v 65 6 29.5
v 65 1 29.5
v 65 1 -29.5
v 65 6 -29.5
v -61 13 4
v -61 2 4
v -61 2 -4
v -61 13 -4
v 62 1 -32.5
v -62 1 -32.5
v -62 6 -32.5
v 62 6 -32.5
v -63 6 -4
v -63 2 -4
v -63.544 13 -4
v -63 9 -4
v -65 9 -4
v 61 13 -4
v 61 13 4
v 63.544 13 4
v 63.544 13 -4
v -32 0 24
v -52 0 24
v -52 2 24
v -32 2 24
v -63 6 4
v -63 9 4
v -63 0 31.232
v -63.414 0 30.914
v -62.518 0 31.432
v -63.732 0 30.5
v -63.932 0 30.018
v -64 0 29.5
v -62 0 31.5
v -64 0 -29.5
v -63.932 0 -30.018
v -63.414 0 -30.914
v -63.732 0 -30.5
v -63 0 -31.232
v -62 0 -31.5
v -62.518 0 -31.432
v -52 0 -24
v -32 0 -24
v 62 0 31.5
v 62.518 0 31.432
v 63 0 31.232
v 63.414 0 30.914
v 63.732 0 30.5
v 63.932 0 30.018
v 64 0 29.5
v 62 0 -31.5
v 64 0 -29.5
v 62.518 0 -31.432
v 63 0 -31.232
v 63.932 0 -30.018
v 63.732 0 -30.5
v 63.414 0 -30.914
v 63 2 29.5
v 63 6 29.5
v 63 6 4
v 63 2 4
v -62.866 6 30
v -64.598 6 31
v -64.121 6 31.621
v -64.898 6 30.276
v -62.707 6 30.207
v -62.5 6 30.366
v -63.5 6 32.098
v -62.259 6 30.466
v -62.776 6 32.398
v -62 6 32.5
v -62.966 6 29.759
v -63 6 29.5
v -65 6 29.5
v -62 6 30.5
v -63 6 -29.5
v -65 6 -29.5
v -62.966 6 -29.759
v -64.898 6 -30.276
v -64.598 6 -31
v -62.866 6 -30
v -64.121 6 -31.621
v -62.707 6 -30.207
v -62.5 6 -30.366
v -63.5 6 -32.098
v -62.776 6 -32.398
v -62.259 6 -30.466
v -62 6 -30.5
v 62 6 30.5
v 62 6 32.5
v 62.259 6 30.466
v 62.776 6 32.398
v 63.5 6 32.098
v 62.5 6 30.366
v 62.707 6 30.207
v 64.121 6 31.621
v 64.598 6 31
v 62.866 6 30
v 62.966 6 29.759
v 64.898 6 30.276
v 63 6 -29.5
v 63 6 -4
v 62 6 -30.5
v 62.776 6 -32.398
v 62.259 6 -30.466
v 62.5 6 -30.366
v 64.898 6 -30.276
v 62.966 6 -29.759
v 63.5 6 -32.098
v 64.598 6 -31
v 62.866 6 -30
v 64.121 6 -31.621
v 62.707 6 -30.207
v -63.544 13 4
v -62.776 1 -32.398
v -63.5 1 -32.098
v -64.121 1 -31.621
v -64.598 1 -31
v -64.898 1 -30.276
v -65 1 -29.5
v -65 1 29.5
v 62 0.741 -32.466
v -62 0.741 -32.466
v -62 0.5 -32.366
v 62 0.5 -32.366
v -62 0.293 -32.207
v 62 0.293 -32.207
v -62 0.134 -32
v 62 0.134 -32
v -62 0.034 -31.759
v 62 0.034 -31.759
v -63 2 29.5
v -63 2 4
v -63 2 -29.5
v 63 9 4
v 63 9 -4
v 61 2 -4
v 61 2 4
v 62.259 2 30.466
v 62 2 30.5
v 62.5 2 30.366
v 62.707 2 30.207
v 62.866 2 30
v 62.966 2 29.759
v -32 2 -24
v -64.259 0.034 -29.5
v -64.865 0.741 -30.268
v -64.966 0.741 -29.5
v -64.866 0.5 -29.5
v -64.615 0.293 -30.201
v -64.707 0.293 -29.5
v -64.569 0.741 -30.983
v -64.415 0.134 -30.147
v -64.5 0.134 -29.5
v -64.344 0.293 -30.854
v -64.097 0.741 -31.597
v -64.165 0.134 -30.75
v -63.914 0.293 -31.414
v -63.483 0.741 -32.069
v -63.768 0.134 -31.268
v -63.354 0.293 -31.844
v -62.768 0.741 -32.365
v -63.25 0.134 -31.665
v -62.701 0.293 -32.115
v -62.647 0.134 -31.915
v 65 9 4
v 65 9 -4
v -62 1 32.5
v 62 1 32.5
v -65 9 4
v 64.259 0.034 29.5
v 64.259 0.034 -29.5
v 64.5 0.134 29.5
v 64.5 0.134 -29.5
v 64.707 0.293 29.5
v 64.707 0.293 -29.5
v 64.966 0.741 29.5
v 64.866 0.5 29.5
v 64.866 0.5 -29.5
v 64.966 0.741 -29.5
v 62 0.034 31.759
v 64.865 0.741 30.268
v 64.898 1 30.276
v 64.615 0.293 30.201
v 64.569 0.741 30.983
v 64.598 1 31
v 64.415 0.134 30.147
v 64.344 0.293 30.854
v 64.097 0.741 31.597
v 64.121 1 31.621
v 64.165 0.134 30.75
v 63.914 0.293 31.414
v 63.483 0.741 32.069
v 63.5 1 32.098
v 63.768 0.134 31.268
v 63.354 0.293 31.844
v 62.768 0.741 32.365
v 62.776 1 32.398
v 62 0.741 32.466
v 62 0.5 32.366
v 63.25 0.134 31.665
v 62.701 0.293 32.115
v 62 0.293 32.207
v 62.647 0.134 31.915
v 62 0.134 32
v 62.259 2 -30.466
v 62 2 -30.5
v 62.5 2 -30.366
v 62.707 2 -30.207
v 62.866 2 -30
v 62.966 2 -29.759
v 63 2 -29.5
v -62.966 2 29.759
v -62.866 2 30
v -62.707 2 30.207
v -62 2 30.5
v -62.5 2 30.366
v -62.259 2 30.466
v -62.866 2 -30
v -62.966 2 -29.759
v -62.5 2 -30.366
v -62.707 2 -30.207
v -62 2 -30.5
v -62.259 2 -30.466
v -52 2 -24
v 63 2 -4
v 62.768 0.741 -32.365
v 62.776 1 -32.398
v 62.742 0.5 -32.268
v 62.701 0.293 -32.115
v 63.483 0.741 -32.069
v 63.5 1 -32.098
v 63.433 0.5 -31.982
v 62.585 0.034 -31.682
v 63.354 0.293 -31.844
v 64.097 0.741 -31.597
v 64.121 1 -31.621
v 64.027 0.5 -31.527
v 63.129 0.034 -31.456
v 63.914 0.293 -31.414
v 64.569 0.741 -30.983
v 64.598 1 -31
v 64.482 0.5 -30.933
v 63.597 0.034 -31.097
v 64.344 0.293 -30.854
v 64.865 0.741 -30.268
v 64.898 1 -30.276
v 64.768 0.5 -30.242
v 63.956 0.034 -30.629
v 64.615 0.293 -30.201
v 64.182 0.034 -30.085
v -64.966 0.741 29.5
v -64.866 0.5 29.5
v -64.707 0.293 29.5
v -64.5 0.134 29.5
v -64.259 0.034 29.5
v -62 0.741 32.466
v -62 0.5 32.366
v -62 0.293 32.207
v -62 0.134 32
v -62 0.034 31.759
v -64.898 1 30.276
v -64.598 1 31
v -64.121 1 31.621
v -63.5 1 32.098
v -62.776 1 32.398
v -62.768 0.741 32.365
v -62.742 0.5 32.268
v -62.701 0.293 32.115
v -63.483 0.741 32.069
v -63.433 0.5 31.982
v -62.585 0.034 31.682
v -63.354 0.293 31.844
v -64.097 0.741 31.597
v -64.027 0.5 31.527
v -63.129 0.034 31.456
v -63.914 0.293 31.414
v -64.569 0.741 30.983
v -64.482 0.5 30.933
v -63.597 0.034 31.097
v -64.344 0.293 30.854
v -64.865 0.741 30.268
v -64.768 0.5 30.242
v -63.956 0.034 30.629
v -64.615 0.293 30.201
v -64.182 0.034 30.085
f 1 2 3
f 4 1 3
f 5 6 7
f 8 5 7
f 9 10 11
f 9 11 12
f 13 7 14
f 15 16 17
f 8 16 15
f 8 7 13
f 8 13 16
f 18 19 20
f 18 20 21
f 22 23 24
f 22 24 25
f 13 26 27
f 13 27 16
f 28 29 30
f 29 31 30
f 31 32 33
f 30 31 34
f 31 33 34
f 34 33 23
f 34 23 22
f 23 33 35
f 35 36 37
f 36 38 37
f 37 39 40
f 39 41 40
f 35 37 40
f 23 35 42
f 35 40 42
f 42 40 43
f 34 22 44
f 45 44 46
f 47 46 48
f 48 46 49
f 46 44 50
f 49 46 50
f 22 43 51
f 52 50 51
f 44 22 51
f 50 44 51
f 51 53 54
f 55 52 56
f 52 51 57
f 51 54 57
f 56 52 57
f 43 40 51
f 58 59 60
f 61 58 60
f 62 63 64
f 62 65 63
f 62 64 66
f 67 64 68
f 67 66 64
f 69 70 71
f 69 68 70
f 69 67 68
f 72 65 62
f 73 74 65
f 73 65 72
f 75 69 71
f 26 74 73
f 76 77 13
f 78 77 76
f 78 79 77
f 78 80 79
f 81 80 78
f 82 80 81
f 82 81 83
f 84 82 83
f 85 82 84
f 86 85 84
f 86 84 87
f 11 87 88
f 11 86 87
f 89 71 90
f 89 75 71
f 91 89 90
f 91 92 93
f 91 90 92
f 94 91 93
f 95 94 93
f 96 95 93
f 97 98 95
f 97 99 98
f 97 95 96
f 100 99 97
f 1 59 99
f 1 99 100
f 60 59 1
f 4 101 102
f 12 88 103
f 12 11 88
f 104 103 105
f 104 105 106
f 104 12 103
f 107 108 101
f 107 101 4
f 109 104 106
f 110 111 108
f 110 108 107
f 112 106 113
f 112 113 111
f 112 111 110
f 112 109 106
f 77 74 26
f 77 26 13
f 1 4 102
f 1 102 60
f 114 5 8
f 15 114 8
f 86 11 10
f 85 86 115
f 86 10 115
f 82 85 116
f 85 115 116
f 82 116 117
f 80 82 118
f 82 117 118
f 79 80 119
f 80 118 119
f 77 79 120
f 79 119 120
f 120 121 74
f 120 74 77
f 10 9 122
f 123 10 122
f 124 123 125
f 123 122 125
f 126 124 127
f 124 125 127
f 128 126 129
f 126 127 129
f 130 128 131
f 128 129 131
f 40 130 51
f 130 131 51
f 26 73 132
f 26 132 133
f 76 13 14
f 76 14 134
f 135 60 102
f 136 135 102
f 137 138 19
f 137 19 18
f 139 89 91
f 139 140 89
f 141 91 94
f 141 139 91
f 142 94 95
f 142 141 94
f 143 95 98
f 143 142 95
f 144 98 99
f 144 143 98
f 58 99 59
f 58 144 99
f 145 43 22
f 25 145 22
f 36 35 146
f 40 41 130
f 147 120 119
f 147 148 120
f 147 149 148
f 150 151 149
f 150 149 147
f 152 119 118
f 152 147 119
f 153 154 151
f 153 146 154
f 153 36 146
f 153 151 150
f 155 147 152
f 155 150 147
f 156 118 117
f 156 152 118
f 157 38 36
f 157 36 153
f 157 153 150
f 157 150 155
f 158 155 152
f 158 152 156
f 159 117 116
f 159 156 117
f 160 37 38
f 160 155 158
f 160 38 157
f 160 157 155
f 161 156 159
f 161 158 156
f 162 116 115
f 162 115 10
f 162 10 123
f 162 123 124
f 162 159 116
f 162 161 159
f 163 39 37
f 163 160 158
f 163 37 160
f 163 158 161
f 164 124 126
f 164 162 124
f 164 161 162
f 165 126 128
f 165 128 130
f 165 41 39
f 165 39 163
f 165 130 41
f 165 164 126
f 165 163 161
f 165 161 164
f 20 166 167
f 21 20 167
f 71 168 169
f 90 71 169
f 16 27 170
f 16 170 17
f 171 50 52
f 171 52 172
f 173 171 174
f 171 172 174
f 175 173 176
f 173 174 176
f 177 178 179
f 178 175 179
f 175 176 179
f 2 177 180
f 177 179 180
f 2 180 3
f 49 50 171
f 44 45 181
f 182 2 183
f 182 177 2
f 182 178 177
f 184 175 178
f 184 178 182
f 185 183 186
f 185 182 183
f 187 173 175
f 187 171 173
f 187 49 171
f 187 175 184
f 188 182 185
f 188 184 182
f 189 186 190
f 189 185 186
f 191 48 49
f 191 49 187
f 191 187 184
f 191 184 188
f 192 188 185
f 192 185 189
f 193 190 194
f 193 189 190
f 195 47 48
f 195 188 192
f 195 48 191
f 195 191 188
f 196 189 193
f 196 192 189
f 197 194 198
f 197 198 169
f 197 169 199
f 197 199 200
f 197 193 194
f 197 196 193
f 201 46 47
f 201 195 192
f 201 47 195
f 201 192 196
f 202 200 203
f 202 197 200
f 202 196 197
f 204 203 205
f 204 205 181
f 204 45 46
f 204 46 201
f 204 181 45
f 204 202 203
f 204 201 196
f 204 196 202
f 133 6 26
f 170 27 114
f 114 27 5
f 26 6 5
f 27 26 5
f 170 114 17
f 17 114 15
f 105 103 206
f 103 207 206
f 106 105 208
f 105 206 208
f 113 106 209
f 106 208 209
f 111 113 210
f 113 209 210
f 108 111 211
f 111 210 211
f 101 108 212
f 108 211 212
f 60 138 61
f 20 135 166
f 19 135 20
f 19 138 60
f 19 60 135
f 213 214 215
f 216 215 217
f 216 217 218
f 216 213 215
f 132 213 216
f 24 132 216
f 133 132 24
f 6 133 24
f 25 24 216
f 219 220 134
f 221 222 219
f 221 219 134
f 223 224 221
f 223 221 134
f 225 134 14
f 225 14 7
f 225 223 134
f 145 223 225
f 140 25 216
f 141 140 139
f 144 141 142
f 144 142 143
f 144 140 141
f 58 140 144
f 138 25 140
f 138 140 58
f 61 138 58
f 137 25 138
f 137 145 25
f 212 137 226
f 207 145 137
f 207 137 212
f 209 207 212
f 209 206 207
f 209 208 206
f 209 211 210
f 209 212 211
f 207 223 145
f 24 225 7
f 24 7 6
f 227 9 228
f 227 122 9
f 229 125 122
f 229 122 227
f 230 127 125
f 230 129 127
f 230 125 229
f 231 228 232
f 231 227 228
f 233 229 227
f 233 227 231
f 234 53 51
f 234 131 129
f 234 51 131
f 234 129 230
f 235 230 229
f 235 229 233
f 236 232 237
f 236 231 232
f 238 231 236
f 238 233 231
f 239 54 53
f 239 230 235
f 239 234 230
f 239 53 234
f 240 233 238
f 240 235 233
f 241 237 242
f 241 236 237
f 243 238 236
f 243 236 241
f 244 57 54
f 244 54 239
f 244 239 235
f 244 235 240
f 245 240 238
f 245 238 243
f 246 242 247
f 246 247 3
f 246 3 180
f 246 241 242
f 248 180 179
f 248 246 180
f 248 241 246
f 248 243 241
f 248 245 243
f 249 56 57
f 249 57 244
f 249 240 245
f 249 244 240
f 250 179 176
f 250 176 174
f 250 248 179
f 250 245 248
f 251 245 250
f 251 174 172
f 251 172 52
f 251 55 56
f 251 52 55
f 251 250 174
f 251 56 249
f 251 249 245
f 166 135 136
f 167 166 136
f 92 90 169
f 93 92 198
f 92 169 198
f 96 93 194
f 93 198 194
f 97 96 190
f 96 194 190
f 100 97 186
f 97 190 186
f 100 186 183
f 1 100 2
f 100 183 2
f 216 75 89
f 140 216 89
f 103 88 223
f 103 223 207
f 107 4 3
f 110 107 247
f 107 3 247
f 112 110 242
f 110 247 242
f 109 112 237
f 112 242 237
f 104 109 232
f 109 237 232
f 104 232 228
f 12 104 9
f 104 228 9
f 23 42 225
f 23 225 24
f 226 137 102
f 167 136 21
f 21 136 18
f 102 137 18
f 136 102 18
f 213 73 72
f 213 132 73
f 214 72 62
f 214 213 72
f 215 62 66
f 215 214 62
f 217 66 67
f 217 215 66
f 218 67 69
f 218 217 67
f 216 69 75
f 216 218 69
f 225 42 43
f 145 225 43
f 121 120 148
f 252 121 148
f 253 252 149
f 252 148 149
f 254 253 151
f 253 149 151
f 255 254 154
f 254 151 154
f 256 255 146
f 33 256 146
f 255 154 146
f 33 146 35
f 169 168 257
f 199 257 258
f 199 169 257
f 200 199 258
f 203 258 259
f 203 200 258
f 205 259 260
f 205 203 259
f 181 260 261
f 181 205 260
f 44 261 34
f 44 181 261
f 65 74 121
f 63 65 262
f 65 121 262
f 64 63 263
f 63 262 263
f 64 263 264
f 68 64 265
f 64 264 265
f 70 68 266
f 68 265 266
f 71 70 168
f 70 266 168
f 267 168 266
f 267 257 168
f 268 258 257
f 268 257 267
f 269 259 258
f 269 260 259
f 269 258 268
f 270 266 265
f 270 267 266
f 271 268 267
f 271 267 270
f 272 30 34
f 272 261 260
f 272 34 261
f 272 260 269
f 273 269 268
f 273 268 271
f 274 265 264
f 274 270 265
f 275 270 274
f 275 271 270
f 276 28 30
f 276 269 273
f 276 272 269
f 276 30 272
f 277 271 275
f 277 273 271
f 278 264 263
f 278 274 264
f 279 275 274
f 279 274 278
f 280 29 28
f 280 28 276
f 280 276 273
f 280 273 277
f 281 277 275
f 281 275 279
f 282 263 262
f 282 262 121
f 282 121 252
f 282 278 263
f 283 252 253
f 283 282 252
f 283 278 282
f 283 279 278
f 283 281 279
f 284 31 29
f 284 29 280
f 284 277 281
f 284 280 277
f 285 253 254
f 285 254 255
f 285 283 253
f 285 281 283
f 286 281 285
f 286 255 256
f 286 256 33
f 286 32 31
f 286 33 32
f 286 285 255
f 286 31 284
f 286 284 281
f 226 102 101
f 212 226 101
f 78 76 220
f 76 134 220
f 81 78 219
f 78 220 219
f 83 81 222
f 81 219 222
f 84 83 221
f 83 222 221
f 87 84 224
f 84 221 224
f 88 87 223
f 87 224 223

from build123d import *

# Parameters (mm, degrees)
SKETCH_1_W                  = 130
SKETCH_1_H                  = 65
EXTRUDE_1_DEPTH             = 6
SKETCH_2_W                  = 126
SKETCH_2_H                  = 61
CUT_EXTRUDE_1_DEPTH         = 4
FILLET_1_R                  = 1
SKETCH_9_W                  = 20
SKETCH_9_H                  = 48
CUT_EXTRUDE_3_DEPTH         = 2
SKETCH_6_W                  = 2
SKETCH_6_H                  = 8
EXTRUDE_2_DEPTH             = 11
SKETCH_12_W                 = 8
SKETCH_12_H                 = 4
EXTRUDE_4_DEPTH             = 2
CHAMFER_2_SIZE2             = 4
CHAMFER_2_SIZE              = 1.455880937
CHAMFER_2_OF_MIRROR_2_SIZE2 = 1.455880937
CHAMFER_2_OF_MIRROR_2_SIZE  = 4
FILLET_2_R                  = 1
FILLET_3_R                  = 3


# Some blends are built 0.0001 mm under size
with BuildPart() as part:
    # Эскиз1 → Бобышка-Вытянуть1 (new body)
    with BuildSketch(Plane(origin=(0, 0, 0), x_dir=(1, 0, 0), z_dir=(0, 1, 0))):
        Rectangle(SKETCH_1_W, SKETCH_1_H)
    extrude(amount=EXTRUDE_1_DEPTH)

    # Эскиз2 → Вырез-Вытянуть1 (cut)
    with BuildSketch(Plane(origin=(0, 6, 0), x_dir=(1, 0, 0), z_dir=(0, 1, 0))):
        Rectangle(SKETCH_2_W, SKETCH_2_H)
    extrude(amount=-CUT_EXTRUDE_1_DEPTH, mode=Mode.SUBTRACT)

    # Скругление1
    fillet_1_edges = [part.edges().sort_by_distance(p)[0] for p in [
        (0, 0, 32.5),
        (-65, 0, 0),
        (0, 0, -32.5),
        (65, 0, 0),
    ]]
    fillet(fillet_1_edges, radius=FILLET_1_R)

    # Эскиз9 → Вырез-Вытянуть3 (cut)
    with BuildSketch(Plane.XZ):
        with Locations((-42, 0)):
            Rectangle(SKETCH_9_W, SKETCH_9_H)
    extrude(amount=-CUT_EXTRUDE_3_DEPTH, mode=Mode.SUBTRACT)

    # Эскиз6 → Бобышка-Вытянуть2 (add)
    with BuildSketch(Plane(origin=(0, 2, 0), x_dir=(1, 0, 0), z_dir=(0, 1, 0))):
        with Locations((62, 0)):
            Rectangle(SKETCH_6_W, SKETCH_6_H)
    extrude_2 = extrude(amount=EXTRUDE_2_DEPTH)

    # Эскиз12 → Бобышка-Вытянуть4 (add)
    with BuildSketch(Plane(origin=(63, 0, 0), x_dir=(0, 0, -1), z_dir=(1, 0, 0))):
        with Locations((0, 11)):
            Rectangle(SKETCH_12_W, SKETCH_12_H)
    extrude_4 = extrude(amount=EXTRUDE_4_DEPTH)

    # Фаска2
    chamfer_2_edges = [part.edges().sort_by_distance(p)[0] for p in [
        (65, 13, 0),
    ]]
    chamfer_2_side = [part.faces().sort_by_distance(p)[0] for p in [
        (64.970882381, 13, 0),
    ]]
    chamfer(chamfer_2_edges, length=CHAMFER_2_SIZE - 0.0001, length2=CHAMFER_2_SIZE2 - 0.0001, reference=chamfer_2_side[0])  # a hair under: the kernel refuses the full size

    # Зеркальное отражение2: Бобышка-Вытянуть2, Бобышка-Вытянуть4 across plane
    add(extrude_2.mirror(Plane(origin=(0, 0, 0), x_dir=(0, 0, 1), z_dir=(1, 0, 0))))
    add(extrude_4.mirror(Plane(origin=(0, 0, 0), x_dir=(0, 0, 1), z_dir=(1, 0, 0))))

    # Фаска2 of Зеркальное отражение2
    chamfer_2_of_mirror_2_edges = [part.edges().sort_by_distance(p)[0] for p in [
        (-65, 13, 0),
    ]]
    chamfer_2_of_mirror_2_side = [part.faces().sort_by_distance(p)[0] for p in [
        (-65, 12.970882381, 0),
    ]]
    chamfer(chamfer_2_of_mirror_2_edges, length=CHAMFER_2_OF_MIRROR_2_SIZE - 0.0001, length2=CHAMFER_2_OF_MIRROR_2_SIZE2 - 0.0001, reference=chamfer_2_of_mirror_2_side[0])  # a hair under: the kernel refuses the full size

    # Скругление2
    fillet_2_edges = [part.edges().sort_by_distance(p)[0] for p in [
        (63, 4, -30.5),
        (63, 4, 30.5),
        (-63, 4, 30.5),
        (-63, 4, -30.5),
    ]]
    fillet(fillet_2_edges, radius=FILLET_2_R)

    # Скругление3
    # the kernel refuses this fillet: 3 mm, written as the material it takes off along each edge
    with BuildSketch(Plane(origin=(-62, 0, 29.5), x_dir=(0, 0, 1), z_dir=(1, 0, 0))) as fillet_3_piece_1:
        with BuildLine():
            CenterArc((2, -1), 1, 0, 90)
            Line((3, -1), (3, 0))
            Line((3, 0), (2, 0))
        make_face()
    revolve(axis=Axis((-62, 0, 29.5), (0, -1, 0)), revolution_arc=90, mode=Mode.SUBTRACT)
    with BuildSketch(Plane(origin=(-62, 0, -29.5), x_dir=(-1, 0, 0), z_dir=(0, 0, 1))) as fillet_3_piece_2:
        with BuildLine():
            CenterArc((2, -1), 1, 0, 90)
            Line((3, -1), (3, 0))
            Line((3, 0), (2, 0))
        make_face()
    revolve(axis=Axis((-62, 0, -29.5), (0, -1, 0)), revolution_arc=90, mode=Mode.SUBTRACT)
    with BuildSketch(Plane(origin=(62, 0, 29.5), x_dir=(1, 0, 0), z_dir=(0, 0, -1))) as fillet_3_piece_3:
        with BuildLine():
            CenterArc((2, -1), 1, 0, 90)
            Line((3, -1), (3, 0))
            Line((3, 0), (2, 0))
        make_face()
    revolve(axis=Axis((62, 0, 29.5), (0, -1, 0)), revolution_arc=90, mode=Mode.SUBTRACT)
    with BuildSketch(Plane(origin=(62, 0, -29.5), x_dir=(0, 0, -1), z_dir=(-1, 0, 0))) as fillet_3_piece_4:
        with BuildLine():
            CenterArc((2, -1), 1, 0, 90)
            Line((3, -1), (3, 0))
            Line((3, 0), (2, 0))
        make_face()
    revolve(axis=Axis((62, 0, -29.5), (0, -1, 0)), revolution_arc=90, mode=Mode.SUBTRACT)
    with BuildSketch(Plane(origin=(65, 0, 32.5), x_dir=(-1, 0, 0), z_dir=(0, 1, 0)), Plane(origin=(65, 0, -32.5), x_dir=(0, 0, 1), z_dir=(0, 1, 0))) as fillet_3_piece_5:
        with BuildLine():
            CenterArc((FILLET_3_R, -FILLET_3_R), FILLET_3_R, 90, 90)
            Line((0, -FILLET_3_R), (0, 0))
            Line((0, 0), (FILLET_3_R, 0))
        make_face()
    extrude(amount=13.5, mode=Mode.SUBTRACT)
    with BuildSketch(Plane(origin=(-65, 0, 32.5), x_dir=(1, 0, 0), z_dir=(0, 1, 0)), Plane(origin=(-65, 0, -32.5), x_dir=(0, 0, 1), z_dir=(0, 1, 0))) as fillet_3_piece_6:
        with BuildLine():
            CenterArc((FILLET_3_R, FILLET_3_R), FILLET_3_R, 180, 90)
            Line((0, FILLET_3_R), (0, 0))
            Line((0, 0), (FILLET_3_R, 0))
        make_face()
    extrude(amount=13.5, mode=Mode.SUBTRACT)


solid = part.part
